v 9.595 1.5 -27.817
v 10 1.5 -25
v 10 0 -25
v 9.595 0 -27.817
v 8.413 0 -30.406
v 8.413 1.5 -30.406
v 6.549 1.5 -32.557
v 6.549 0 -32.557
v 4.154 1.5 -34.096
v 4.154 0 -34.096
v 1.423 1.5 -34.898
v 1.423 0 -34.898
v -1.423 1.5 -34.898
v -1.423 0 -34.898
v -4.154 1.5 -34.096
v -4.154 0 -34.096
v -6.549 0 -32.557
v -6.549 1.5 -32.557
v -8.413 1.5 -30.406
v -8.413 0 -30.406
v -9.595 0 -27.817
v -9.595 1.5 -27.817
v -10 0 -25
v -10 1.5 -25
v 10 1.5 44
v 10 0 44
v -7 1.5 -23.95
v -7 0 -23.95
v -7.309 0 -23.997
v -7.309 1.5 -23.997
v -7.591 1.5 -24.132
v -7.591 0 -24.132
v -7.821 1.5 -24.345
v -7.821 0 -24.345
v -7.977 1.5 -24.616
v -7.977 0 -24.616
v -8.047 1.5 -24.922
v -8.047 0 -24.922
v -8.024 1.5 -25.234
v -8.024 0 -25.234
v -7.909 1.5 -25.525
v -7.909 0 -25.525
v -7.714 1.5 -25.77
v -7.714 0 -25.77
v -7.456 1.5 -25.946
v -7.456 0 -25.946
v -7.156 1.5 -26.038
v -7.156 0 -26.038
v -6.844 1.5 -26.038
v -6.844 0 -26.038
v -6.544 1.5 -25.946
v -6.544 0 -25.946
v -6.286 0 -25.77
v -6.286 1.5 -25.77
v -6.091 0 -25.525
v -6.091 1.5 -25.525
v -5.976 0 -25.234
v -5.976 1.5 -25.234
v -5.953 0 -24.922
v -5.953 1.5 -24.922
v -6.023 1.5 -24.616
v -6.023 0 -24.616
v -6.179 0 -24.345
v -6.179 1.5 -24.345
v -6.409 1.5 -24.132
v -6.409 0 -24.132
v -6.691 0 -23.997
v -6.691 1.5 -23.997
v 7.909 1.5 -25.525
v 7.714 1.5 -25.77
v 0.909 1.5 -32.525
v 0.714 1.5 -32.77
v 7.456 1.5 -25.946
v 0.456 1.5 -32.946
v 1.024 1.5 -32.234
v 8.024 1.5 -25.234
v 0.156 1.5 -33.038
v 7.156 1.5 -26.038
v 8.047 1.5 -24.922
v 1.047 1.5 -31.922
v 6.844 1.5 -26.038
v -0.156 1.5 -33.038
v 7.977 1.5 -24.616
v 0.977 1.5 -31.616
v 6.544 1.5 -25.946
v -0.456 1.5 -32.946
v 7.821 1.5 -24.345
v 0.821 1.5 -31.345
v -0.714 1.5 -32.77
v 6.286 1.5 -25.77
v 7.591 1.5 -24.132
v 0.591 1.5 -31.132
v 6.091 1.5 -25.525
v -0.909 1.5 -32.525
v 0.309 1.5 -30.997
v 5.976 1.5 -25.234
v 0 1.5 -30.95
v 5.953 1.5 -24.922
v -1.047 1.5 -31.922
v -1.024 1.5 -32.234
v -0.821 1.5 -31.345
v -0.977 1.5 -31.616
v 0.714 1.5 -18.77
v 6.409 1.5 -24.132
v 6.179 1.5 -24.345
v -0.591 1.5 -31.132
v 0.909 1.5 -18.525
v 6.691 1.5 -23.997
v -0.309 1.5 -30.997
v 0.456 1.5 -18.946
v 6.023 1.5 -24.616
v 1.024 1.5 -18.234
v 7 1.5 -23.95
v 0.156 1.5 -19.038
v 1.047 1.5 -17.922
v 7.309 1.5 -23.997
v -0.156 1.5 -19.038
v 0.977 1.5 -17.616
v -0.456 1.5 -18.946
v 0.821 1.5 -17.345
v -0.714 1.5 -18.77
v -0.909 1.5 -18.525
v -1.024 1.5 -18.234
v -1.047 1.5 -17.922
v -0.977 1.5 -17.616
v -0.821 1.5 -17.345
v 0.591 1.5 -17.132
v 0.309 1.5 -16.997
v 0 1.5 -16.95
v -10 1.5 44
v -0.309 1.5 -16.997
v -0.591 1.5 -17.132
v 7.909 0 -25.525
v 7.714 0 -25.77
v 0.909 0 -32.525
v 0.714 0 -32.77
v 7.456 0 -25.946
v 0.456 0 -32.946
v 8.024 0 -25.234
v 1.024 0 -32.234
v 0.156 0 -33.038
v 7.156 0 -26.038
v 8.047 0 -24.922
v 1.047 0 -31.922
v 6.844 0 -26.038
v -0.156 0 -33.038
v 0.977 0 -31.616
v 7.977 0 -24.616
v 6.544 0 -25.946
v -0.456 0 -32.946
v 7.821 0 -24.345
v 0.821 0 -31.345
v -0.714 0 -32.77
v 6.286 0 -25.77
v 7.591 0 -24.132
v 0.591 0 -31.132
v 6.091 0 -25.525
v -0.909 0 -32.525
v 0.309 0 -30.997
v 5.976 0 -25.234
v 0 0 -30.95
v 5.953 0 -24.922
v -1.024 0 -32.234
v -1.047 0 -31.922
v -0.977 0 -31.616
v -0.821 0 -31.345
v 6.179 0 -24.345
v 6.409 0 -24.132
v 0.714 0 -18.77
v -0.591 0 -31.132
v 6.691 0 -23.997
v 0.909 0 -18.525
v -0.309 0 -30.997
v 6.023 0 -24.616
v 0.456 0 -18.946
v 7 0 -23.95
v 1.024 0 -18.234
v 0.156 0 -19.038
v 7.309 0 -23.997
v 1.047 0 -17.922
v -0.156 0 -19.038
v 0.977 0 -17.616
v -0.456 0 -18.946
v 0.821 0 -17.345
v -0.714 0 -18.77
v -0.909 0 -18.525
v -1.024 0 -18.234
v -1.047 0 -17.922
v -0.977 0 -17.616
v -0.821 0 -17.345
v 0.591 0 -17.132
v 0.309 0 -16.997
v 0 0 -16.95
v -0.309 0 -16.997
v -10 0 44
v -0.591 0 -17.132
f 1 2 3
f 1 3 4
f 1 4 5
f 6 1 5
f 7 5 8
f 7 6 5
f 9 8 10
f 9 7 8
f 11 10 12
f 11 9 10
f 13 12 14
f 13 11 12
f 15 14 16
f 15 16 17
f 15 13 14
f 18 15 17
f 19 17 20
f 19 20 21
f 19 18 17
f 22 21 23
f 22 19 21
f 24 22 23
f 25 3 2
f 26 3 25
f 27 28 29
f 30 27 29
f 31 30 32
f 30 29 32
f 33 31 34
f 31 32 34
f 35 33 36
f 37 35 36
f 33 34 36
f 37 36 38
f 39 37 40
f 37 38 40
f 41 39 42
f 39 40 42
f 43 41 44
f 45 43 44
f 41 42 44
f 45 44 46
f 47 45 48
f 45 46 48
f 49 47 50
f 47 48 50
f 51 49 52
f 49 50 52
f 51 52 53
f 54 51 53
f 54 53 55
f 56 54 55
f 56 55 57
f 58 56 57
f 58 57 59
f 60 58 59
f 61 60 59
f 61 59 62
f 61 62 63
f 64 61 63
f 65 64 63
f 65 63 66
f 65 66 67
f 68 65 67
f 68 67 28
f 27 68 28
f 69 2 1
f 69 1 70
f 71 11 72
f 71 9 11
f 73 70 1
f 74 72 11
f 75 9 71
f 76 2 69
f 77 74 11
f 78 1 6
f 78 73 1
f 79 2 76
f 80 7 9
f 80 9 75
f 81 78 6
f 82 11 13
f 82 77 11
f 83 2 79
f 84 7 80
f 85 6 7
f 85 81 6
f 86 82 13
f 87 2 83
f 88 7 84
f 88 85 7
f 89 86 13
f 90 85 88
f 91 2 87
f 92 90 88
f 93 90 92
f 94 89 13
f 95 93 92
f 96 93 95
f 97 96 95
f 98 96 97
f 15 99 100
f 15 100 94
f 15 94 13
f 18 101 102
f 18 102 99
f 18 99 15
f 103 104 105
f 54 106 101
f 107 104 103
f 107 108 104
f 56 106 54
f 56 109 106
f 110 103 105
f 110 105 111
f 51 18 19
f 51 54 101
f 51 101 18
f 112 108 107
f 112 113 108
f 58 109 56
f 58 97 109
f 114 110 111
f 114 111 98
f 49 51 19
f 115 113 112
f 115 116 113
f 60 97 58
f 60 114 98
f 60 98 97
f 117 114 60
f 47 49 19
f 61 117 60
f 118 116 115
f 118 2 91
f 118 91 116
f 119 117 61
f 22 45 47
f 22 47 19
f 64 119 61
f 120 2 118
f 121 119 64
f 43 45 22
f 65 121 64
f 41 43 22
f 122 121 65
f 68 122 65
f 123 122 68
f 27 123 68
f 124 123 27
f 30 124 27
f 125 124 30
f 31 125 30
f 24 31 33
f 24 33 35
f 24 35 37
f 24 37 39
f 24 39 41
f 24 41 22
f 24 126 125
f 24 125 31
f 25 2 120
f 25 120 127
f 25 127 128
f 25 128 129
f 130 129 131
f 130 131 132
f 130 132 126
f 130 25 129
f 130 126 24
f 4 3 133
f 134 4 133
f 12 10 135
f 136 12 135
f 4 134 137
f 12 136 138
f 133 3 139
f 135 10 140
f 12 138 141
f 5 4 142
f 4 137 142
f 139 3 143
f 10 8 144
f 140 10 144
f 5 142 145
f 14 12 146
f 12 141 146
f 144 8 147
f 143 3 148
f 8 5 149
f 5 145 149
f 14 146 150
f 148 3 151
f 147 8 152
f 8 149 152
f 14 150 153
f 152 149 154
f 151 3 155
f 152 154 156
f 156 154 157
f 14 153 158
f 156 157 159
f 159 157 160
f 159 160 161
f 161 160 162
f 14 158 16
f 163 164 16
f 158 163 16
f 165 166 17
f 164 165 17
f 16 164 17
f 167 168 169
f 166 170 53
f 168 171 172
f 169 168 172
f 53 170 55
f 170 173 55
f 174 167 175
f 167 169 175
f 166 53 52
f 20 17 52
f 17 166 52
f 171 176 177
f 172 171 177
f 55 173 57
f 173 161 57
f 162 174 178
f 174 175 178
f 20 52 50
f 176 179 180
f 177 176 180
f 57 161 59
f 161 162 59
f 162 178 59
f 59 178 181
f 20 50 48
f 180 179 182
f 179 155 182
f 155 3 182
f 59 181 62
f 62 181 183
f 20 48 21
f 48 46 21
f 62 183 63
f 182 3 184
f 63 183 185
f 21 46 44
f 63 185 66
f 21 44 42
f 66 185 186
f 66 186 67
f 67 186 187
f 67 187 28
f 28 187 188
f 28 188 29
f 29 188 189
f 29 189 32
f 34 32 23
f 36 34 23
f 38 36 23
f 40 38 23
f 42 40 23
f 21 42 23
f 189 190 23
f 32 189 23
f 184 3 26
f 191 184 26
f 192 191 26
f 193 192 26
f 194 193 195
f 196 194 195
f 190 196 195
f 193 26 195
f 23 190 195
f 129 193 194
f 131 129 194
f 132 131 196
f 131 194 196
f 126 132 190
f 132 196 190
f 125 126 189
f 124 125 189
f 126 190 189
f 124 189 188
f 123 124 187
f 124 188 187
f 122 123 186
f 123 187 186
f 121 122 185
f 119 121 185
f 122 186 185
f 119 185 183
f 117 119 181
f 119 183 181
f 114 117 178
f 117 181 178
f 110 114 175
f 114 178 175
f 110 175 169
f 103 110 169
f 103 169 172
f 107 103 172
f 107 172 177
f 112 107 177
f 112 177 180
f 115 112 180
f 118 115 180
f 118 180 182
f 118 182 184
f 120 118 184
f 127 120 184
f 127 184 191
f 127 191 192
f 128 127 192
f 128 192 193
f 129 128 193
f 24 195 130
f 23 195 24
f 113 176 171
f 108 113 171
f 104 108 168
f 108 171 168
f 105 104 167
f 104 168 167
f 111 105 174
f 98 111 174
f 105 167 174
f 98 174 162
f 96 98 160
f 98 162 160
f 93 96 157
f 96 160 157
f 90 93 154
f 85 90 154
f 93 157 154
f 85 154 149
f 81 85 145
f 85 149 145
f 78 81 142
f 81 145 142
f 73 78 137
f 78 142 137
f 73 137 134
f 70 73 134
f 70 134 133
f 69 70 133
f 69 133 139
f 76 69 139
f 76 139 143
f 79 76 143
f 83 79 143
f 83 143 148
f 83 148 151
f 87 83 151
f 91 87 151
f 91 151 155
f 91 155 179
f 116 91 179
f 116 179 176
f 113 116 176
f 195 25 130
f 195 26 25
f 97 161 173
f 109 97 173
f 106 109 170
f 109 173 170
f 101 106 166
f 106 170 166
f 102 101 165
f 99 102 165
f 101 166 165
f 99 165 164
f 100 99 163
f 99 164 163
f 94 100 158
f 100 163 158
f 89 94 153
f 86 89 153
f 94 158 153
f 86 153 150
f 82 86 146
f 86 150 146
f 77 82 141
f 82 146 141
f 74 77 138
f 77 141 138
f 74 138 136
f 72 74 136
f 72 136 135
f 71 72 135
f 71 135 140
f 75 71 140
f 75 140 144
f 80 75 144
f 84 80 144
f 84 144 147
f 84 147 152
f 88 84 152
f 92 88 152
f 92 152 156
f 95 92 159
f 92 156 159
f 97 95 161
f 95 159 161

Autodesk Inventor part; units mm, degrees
ref_plane "YZ Plane" through (0, 0, 0) normal (1, 0, 0) x (0, 1, 0)
ref_plane "XZ Plane" through (0, 0, 0) normal (0, 1, 0) x (-1, 0, 0)
ref_plane "XY Plane" through (0, 0, 0) normal (0, 0, 1) x (1, 0, 0)
sketch "Sketch1" plane through (0, 0, 0) normal (0, 1, 0) x (-1, 0, 0)
  line L0 (10, -35) -> (-10, -35)
  line L1 (-10, -35) -> (-10, 44)
  line L2 (-10, 44) -> (10, 44)
  line L3 (10, 44) -> (10, -35)
  point P0 (0, 0)
  dimension "d0" = 20
  dimension "d1" = 79
  dimension "d2" = 35
  dimension "d3" = 10
extrude "Plate1" add sketch "Sketch1" along normal blind 1.5
sketch "Sketch3" plane through (0, 1.5, 0) normal (0, 1, 0) x (1, 0, 0)
  circle A0 centre (0, 25) radius 10
  circle A1 centre (0, -25) radius 10
  line L0 (-10, 35) -> (10, 35) projected
  line L1 (10, -44) -> (-10, -44) projected
  line L2 (-10, 35) -> (10, 35)
  line L3 (10, 35) -> (10, 25)
  line L4 (10, 25) -> (-10, 25)
  line L5 (-10, 25) -> (-10, 35)
  line L6 (10, -35) -> (-10, -35)
  line L7 (-10, -35) -> (-10, -25)
  line L8 (-10, -25) -> (10, -25)
  line L9 (10, -25) -> (10, -44)
  point P0 (0, 0)
  point P1 (10, -25)
  point P2 (0, -35)
  point P3 (-10, -35)
  point P4 (0, 35)
  point P5 (10, 35)
  dimension "d12" = 20
  dimension "d13" = 20
  dimension "d14" = 10
  dimension "d15" = 10
  dimension "d16" = 25
  dimension "d17" = 25
  dimension "d18" = 10
extrude "Extrusion1" cut sketch "Sketch3" against normal blind 10 contours L5 L0 A0 | A0 L0 L3
sketch "Sketch4" plane through (0, 1.5, 0) normal (0, 1, 0) x (1, 0, 0)
  circle A0 centre (-7, 25) radius 0.8
  arc A1 (10, 25) -> (-10, 25) centre (0, 25) ccw projected
  circle A2 centre (0, 18) radius 0.8
  circle A3 centre (7, 25) radius 0.8
  circle A4 centre (0, 32) radius 0.8
  point P0 (0, 0)
  dimension "d21" = 0
  dimension "d22" = 7
  dimension "d23" = 1.6
  dimension "d26" = 360
hole "Hole2" at (0, 1.5, -32) at (7, 1.5, -25) at (0, 1.5, -18) at (-7, 1.5, -25) direction (0, -1, 0) diameter 2.1 depth 1.5
equation "\"d33\" = Thickness"
equation "\"d4\" = Thickness"
equation "\"BendReliefWidth\" = Thickness"
equation "\"BendReliefDepth\" = 0.5 * Thickness"
equation "\"CornerReliefSize\" = 4 * Thickness"
equation "\"MinimumRemnant\" = 2 * Thickness"
equation "\"TransitionRadius\" = BendRadius"
equation "\"JacobiRadiusSize\" = BendRadius"
equation "\"GapSize\" = Thickness"
equation "\"Thickness\" = 1.5"
equation "\"BendRadius\" = 0.31"
properties part number "axis_8_10_connector_frame" material "Aluminum 6061-AHC"
